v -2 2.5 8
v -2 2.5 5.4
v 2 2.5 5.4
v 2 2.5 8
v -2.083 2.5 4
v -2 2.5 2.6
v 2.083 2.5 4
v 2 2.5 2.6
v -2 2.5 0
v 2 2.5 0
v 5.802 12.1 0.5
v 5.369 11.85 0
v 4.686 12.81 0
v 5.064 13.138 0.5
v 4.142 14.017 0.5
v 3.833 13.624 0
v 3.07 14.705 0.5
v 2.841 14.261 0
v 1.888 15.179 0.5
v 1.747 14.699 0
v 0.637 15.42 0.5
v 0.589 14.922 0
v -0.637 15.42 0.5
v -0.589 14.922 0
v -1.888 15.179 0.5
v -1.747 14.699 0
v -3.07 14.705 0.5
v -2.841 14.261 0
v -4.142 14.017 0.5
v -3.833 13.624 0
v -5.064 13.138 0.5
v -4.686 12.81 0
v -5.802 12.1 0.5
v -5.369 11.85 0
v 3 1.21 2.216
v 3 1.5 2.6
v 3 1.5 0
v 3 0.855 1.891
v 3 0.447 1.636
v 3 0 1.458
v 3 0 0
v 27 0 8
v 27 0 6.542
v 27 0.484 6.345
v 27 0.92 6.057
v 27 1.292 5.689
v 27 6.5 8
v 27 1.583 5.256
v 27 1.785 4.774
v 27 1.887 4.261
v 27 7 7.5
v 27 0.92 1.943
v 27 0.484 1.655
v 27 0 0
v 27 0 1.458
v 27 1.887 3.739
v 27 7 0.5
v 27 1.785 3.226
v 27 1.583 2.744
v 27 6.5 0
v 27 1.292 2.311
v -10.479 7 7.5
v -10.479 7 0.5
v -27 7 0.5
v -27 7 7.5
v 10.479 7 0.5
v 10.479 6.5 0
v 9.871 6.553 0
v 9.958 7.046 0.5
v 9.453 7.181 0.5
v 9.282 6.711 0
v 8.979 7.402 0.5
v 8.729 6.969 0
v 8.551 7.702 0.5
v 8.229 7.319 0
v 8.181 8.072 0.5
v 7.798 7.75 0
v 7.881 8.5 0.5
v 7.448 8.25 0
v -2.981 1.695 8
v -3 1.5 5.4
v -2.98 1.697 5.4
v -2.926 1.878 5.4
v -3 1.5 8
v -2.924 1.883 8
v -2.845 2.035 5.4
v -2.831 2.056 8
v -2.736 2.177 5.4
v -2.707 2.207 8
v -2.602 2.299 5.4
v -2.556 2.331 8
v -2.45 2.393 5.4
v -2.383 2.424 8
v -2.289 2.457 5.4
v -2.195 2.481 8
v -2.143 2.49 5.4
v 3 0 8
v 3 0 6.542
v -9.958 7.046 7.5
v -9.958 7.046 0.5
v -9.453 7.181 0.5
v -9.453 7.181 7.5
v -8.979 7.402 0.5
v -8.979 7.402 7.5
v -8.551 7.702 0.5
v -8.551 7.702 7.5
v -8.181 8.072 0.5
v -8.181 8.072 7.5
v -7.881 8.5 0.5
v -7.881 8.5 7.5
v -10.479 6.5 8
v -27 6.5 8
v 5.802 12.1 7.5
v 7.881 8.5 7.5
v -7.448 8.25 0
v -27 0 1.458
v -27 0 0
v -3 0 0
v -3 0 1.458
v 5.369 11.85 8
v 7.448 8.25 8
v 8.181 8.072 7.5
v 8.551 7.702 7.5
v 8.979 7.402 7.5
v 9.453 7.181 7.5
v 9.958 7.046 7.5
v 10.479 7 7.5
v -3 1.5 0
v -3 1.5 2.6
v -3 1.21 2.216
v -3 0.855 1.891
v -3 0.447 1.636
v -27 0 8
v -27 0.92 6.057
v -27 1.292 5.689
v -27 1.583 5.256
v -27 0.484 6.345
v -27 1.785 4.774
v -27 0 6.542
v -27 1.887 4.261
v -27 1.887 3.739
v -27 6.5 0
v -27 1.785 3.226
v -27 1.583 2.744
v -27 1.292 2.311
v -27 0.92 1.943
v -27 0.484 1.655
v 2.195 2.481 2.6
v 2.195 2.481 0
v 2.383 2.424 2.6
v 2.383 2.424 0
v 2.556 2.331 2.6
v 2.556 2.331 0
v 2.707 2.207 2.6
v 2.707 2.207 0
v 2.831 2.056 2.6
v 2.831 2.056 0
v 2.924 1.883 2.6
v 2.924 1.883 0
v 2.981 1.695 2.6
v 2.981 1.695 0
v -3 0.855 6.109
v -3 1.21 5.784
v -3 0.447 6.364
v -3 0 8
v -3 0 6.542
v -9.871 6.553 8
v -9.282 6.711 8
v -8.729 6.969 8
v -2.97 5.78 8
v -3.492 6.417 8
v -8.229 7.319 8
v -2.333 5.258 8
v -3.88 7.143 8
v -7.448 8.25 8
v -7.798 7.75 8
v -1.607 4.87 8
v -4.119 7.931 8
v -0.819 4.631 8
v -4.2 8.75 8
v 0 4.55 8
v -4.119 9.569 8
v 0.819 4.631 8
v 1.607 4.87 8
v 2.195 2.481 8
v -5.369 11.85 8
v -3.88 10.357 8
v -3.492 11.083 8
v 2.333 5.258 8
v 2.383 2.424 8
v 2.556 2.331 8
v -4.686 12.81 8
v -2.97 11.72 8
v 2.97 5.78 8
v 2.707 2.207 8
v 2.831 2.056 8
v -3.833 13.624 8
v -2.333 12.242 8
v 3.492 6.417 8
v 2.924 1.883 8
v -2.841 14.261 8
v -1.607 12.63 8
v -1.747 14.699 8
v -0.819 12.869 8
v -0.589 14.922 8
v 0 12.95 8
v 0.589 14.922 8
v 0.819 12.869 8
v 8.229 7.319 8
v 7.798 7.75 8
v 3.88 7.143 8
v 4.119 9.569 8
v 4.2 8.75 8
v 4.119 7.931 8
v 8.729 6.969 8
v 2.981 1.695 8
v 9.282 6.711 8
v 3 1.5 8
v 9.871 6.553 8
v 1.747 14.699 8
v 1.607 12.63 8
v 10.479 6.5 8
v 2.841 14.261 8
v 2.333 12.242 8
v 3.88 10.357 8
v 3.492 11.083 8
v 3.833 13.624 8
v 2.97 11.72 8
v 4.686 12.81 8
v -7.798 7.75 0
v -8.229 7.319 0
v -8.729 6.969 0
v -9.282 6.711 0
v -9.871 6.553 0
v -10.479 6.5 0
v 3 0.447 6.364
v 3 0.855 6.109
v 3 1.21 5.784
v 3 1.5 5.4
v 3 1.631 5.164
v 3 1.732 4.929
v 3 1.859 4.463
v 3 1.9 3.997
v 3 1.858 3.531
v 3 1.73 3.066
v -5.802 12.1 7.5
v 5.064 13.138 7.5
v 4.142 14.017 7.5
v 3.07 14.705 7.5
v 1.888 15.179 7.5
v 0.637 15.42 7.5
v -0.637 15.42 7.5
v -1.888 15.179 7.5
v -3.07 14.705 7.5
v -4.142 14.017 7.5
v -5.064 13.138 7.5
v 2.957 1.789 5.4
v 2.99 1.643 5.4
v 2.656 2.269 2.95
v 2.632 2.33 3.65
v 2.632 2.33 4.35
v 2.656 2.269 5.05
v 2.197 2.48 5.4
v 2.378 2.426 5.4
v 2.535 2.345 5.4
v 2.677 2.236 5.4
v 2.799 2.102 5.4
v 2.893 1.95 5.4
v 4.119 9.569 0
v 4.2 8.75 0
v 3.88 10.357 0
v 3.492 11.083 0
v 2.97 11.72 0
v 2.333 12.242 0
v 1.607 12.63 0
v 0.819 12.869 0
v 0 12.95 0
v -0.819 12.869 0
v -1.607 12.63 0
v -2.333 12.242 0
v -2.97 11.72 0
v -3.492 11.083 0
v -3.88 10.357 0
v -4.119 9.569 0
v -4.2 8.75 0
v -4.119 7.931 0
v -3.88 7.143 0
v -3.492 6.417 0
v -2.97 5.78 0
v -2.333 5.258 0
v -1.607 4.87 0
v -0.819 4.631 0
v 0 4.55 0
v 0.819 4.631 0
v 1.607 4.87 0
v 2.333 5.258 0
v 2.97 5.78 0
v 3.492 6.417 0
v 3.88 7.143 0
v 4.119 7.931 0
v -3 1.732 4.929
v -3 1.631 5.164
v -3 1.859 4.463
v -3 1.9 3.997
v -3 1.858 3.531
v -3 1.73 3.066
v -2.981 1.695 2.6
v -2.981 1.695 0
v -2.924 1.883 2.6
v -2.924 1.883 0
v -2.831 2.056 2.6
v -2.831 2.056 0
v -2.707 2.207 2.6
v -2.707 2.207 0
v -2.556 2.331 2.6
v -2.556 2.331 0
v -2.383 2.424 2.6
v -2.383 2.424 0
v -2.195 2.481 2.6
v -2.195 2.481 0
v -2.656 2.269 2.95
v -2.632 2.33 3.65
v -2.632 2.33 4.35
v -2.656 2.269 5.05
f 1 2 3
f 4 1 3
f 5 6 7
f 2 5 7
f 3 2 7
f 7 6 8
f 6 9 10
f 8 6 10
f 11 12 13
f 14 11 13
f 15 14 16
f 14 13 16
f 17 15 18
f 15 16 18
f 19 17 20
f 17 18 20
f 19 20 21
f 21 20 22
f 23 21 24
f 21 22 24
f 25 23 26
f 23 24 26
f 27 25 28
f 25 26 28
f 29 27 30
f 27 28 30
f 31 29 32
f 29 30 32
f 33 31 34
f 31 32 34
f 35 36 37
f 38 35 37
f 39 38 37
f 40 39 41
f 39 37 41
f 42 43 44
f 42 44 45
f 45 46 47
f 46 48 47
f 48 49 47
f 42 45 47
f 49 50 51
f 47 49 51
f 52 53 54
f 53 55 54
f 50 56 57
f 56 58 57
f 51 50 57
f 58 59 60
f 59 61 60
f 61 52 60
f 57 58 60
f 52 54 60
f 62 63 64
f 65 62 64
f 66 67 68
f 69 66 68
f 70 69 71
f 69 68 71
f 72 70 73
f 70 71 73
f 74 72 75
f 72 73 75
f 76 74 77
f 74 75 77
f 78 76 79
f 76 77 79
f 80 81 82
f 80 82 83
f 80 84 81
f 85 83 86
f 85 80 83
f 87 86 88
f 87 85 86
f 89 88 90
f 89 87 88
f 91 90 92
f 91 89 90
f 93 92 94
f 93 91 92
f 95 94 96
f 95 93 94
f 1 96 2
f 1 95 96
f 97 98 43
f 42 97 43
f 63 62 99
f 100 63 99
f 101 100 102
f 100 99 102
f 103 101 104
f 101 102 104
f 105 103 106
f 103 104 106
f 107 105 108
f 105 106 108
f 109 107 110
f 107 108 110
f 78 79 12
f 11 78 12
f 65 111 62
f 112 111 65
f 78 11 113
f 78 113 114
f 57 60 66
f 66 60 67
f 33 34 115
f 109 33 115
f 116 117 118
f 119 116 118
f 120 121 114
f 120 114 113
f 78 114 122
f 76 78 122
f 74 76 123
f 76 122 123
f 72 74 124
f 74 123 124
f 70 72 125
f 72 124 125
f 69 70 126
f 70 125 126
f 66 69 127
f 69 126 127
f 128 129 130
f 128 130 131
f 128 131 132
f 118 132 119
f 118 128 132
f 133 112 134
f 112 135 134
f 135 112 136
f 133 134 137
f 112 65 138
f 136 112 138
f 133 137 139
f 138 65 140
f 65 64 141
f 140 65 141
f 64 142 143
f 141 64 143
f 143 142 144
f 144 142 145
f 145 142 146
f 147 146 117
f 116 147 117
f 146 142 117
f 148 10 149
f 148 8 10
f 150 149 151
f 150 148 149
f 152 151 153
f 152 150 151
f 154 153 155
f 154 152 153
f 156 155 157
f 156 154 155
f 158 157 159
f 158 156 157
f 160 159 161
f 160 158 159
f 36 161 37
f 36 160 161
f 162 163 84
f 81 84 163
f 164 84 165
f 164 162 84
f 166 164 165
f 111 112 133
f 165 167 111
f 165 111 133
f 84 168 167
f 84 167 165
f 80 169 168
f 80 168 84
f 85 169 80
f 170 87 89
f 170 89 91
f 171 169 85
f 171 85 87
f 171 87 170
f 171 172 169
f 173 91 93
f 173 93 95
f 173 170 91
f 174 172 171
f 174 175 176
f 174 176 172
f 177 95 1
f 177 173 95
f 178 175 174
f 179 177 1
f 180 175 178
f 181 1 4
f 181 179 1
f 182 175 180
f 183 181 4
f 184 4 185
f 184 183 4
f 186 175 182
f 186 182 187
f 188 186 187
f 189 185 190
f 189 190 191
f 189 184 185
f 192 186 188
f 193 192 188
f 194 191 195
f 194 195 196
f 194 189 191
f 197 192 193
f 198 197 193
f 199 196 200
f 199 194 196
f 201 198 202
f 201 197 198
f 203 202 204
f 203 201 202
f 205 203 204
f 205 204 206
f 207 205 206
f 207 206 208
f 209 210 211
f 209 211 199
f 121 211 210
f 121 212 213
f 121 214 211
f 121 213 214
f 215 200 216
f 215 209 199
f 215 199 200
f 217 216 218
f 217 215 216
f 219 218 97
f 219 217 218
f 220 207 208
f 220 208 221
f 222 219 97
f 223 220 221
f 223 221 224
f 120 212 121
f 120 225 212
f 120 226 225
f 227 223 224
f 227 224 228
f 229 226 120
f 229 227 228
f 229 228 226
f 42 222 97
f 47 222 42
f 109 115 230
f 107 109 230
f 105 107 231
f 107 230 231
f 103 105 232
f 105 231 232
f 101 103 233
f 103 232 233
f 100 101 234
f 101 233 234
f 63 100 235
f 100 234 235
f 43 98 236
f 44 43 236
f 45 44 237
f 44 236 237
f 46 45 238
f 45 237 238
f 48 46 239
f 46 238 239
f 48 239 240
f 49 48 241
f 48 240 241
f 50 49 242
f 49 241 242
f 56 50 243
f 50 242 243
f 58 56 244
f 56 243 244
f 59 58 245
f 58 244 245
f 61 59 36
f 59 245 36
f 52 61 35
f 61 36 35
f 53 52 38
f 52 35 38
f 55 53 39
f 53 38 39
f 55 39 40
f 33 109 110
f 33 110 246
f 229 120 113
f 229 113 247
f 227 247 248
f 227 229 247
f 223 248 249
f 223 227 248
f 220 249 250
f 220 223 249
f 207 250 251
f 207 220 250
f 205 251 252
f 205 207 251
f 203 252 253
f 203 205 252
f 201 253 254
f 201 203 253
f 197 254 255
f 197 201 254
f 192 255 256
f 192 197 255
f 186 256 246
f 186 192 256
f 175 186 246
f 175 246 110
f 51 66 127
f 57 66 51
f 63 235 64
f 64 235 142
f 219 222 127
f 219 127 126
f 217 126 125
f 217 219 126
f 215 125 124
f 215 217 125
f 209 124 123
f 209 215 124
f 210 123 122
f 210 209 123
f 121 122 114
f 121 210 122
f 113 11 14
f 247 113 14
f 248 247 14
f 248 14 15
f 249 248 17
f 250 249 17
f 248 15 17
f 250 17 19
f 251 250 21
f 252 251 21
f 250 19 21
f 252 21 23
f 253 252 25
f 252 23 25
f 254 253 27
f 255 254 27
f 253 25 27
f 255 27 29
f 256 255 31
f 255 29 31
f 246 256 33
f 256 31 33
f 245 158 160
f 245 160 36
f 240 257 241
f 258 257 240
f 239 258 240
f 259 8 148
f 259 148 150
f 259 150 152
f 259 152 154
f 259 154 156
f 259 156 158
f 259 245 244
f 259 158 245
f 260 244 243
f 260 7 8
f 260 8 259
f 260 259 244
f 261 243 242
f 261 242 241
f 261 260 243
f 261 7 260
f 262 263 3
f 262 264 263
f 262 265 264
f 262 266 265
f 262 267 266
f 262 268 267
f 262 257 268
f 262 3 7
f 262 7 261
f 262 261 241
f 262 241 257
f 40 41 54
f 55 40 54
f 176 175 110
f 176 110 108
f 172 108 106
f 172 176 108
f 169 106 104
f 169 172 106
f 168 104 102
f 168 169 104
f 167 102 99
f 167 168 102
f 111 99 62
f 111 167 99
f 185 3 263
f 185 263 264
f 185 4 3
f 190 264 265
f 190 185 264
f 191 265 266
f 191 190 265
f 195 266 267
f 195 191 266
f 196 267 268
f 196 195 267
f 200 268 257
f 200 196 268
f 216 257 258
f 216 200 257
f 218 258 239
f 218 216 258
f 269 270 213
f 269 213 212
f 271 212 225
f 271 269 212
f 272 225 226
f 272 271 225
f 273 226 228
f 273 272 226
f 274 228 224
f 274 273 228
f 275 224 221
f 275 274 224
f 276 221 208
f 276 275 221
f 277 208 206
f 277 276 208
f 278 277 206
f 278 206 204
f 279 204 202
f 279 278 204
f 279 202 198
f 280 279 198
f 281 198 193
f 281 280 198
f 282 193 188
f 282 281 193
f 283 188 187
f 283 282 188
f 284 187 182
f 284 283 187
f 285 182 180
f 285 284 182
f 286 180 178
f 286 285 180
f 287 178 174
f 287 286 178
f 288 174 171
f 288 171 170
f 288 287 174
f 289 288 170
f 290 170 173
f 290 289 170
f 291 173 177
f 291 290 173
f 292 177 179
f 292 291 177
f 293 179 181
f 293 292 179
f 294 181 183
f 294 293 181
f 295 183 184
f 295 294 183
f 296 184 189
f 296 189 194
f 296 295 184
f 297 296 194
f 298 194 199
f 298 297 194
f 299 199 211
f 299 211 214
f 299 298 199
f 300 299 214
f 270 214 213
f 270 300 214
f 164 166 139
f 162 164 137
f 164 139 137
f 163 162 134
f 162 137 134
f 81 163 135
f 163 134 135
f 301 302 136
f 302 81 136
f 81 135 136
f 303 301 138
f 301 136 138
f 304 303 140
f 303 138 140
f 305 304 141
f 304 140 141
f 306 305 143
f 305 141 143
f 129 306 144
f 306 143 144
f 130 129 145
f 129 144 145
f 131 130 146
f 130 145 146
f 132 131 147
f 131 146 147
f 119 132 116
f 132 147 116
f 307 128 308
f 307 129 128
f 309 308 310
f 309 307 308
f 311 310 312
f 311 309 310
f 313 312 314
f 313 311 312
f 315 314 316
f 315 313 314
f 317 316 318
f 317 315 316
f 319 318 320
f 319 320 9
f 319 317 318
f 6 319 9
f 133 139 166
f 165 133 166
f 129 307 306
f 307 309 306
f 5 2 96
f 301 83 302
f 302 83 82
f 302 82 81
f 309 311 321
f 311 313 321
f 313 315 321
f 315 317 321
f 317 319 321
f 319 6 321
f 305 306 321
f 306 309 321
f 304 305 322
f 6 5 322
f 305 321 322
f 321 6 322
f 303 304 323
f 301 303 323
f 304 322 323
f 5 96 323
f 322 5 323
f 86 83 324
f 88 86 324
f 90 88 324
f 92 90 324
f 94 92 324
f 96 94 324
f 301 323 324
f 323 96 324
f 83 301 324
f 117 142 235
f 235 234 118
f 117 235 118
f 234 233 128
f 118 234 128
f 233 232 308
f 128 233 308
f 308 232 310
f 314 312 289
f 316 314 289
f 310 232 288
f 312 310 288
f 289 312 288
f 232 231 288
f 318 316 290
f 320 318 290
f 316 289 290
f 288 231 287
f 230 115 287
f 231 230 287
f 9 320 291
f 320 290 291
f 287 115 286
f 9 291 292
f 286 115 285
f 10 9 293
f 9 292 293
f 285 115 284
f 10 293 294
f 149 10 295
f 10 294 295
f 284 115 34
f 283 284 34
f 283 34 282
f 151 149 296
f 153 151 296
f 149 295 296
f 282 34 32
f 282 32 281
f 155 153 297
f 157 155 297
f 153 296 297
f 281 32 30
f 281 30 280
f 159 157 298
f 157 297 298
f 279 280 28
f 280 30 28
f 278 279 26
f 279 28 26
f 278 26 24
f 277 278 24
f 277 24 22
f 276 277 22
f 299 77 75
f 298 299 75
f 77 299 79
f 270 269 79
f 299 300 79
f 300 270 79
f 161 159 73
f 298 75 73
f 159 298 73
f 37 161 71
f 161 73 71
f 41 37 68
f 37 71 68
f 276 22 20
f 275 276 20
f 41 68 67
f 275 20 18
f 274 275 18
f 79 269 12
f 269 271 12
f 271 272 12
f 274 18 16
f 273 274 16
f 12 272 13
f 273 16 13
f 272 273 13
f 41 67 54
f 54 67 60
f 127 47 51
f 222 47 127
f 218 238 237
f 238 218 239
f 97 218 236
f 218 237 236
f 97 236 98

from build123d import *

# Parameters (mm, degrees)
SKETCH_R        = 4.2
PAD_DEPTH       = 8
SKETCH002_W     = 6
SKETCH002_H     = 2.5
POCKET001_DEPTH = 8.001
SKETCH003_R     = 2.65
POCKET_DEPTH    = 57.001
FILLET_R        = 3
CHAMFER_SIZE    = 0.5
FILLET001_R     = 1


with BuildPart() as part:
    # Sketch → Pad (new body)
    with BuildSketch(Plane.XY):
        with BuildLine():
            Line((-8.746857, 7), (-27, 7))
            Line((-27, 7), (-27, 0))
            Line((-27, 0), (27, 0))
            Line((27, 0), (27, 7))
            Line((8.746857, 7), (27, 7))
            Line((5.80237, 12.1), (8.746857, 7))
            ThreePointArc((5.80237, 12.1), (0, 15.45), (-5.80237, 12.1))
            Line((-8.746857, 7), (-5.80237, 12.1))
        make_face()
        with Locations((0, 8.75)):
            Circle(SKETCH_R, mode=Mode.SUBTRACT)
    extrude(amount=PAD_DEPTH)

    # Sketch002 → Pocket001 (cut, through all)
    with BuildSketch(Plane(origin=(0, 0, 0), x_dir=(1, 0, 0), z_dir=(0, 0, -1))):
        with Locations((0, -1.25)):
            Rectangle(SKETCH002_W, SKETCH002_H)
    extrude(amount=-POCKET001_DEPTH, mode=Mode.SUBTRACT)

    # Sketch003 → Pocket (cut, through all)
    with BuildSketch(Plane(origin=(-30, 0, 0), x_dir=(0, -1, 0), z_dir=(-1, 0, 0))):
        with Locations((0.75, 4)):
            Circle(SKETCH003_R)
    extrude(amount=-POCKET_DEPTH, mode=Mode.SUBTRACT)

    # Fillet
    fillet_edges = [part.edges().sort_by_distance(p)[0] for p in [
        (-8.746857, 7, 4),
        (8.746857, 7, 4),
    ]]
    fillet(fillet_edges, radius=FILLET_R)

    # Chamfer
    chamfer_edges = [part.edges().sort_by_distance(p)[0] for p in [
        (-18.739454, 7, 8),
        (-18.739454, 7, 0),
    ]]
    chamfer(chamfer_edges, length=CHAMFER_SIZE)

    # Fillet001
    fillet001_edges = [part.edges().sort_by_distance(p)[0] for p in [
        (-3, 2.5, 4),
        (3, 2.5, 4),
    ]]
    fillet(fillet001_edges, radius=FILLET001_R)


solid = part.part
